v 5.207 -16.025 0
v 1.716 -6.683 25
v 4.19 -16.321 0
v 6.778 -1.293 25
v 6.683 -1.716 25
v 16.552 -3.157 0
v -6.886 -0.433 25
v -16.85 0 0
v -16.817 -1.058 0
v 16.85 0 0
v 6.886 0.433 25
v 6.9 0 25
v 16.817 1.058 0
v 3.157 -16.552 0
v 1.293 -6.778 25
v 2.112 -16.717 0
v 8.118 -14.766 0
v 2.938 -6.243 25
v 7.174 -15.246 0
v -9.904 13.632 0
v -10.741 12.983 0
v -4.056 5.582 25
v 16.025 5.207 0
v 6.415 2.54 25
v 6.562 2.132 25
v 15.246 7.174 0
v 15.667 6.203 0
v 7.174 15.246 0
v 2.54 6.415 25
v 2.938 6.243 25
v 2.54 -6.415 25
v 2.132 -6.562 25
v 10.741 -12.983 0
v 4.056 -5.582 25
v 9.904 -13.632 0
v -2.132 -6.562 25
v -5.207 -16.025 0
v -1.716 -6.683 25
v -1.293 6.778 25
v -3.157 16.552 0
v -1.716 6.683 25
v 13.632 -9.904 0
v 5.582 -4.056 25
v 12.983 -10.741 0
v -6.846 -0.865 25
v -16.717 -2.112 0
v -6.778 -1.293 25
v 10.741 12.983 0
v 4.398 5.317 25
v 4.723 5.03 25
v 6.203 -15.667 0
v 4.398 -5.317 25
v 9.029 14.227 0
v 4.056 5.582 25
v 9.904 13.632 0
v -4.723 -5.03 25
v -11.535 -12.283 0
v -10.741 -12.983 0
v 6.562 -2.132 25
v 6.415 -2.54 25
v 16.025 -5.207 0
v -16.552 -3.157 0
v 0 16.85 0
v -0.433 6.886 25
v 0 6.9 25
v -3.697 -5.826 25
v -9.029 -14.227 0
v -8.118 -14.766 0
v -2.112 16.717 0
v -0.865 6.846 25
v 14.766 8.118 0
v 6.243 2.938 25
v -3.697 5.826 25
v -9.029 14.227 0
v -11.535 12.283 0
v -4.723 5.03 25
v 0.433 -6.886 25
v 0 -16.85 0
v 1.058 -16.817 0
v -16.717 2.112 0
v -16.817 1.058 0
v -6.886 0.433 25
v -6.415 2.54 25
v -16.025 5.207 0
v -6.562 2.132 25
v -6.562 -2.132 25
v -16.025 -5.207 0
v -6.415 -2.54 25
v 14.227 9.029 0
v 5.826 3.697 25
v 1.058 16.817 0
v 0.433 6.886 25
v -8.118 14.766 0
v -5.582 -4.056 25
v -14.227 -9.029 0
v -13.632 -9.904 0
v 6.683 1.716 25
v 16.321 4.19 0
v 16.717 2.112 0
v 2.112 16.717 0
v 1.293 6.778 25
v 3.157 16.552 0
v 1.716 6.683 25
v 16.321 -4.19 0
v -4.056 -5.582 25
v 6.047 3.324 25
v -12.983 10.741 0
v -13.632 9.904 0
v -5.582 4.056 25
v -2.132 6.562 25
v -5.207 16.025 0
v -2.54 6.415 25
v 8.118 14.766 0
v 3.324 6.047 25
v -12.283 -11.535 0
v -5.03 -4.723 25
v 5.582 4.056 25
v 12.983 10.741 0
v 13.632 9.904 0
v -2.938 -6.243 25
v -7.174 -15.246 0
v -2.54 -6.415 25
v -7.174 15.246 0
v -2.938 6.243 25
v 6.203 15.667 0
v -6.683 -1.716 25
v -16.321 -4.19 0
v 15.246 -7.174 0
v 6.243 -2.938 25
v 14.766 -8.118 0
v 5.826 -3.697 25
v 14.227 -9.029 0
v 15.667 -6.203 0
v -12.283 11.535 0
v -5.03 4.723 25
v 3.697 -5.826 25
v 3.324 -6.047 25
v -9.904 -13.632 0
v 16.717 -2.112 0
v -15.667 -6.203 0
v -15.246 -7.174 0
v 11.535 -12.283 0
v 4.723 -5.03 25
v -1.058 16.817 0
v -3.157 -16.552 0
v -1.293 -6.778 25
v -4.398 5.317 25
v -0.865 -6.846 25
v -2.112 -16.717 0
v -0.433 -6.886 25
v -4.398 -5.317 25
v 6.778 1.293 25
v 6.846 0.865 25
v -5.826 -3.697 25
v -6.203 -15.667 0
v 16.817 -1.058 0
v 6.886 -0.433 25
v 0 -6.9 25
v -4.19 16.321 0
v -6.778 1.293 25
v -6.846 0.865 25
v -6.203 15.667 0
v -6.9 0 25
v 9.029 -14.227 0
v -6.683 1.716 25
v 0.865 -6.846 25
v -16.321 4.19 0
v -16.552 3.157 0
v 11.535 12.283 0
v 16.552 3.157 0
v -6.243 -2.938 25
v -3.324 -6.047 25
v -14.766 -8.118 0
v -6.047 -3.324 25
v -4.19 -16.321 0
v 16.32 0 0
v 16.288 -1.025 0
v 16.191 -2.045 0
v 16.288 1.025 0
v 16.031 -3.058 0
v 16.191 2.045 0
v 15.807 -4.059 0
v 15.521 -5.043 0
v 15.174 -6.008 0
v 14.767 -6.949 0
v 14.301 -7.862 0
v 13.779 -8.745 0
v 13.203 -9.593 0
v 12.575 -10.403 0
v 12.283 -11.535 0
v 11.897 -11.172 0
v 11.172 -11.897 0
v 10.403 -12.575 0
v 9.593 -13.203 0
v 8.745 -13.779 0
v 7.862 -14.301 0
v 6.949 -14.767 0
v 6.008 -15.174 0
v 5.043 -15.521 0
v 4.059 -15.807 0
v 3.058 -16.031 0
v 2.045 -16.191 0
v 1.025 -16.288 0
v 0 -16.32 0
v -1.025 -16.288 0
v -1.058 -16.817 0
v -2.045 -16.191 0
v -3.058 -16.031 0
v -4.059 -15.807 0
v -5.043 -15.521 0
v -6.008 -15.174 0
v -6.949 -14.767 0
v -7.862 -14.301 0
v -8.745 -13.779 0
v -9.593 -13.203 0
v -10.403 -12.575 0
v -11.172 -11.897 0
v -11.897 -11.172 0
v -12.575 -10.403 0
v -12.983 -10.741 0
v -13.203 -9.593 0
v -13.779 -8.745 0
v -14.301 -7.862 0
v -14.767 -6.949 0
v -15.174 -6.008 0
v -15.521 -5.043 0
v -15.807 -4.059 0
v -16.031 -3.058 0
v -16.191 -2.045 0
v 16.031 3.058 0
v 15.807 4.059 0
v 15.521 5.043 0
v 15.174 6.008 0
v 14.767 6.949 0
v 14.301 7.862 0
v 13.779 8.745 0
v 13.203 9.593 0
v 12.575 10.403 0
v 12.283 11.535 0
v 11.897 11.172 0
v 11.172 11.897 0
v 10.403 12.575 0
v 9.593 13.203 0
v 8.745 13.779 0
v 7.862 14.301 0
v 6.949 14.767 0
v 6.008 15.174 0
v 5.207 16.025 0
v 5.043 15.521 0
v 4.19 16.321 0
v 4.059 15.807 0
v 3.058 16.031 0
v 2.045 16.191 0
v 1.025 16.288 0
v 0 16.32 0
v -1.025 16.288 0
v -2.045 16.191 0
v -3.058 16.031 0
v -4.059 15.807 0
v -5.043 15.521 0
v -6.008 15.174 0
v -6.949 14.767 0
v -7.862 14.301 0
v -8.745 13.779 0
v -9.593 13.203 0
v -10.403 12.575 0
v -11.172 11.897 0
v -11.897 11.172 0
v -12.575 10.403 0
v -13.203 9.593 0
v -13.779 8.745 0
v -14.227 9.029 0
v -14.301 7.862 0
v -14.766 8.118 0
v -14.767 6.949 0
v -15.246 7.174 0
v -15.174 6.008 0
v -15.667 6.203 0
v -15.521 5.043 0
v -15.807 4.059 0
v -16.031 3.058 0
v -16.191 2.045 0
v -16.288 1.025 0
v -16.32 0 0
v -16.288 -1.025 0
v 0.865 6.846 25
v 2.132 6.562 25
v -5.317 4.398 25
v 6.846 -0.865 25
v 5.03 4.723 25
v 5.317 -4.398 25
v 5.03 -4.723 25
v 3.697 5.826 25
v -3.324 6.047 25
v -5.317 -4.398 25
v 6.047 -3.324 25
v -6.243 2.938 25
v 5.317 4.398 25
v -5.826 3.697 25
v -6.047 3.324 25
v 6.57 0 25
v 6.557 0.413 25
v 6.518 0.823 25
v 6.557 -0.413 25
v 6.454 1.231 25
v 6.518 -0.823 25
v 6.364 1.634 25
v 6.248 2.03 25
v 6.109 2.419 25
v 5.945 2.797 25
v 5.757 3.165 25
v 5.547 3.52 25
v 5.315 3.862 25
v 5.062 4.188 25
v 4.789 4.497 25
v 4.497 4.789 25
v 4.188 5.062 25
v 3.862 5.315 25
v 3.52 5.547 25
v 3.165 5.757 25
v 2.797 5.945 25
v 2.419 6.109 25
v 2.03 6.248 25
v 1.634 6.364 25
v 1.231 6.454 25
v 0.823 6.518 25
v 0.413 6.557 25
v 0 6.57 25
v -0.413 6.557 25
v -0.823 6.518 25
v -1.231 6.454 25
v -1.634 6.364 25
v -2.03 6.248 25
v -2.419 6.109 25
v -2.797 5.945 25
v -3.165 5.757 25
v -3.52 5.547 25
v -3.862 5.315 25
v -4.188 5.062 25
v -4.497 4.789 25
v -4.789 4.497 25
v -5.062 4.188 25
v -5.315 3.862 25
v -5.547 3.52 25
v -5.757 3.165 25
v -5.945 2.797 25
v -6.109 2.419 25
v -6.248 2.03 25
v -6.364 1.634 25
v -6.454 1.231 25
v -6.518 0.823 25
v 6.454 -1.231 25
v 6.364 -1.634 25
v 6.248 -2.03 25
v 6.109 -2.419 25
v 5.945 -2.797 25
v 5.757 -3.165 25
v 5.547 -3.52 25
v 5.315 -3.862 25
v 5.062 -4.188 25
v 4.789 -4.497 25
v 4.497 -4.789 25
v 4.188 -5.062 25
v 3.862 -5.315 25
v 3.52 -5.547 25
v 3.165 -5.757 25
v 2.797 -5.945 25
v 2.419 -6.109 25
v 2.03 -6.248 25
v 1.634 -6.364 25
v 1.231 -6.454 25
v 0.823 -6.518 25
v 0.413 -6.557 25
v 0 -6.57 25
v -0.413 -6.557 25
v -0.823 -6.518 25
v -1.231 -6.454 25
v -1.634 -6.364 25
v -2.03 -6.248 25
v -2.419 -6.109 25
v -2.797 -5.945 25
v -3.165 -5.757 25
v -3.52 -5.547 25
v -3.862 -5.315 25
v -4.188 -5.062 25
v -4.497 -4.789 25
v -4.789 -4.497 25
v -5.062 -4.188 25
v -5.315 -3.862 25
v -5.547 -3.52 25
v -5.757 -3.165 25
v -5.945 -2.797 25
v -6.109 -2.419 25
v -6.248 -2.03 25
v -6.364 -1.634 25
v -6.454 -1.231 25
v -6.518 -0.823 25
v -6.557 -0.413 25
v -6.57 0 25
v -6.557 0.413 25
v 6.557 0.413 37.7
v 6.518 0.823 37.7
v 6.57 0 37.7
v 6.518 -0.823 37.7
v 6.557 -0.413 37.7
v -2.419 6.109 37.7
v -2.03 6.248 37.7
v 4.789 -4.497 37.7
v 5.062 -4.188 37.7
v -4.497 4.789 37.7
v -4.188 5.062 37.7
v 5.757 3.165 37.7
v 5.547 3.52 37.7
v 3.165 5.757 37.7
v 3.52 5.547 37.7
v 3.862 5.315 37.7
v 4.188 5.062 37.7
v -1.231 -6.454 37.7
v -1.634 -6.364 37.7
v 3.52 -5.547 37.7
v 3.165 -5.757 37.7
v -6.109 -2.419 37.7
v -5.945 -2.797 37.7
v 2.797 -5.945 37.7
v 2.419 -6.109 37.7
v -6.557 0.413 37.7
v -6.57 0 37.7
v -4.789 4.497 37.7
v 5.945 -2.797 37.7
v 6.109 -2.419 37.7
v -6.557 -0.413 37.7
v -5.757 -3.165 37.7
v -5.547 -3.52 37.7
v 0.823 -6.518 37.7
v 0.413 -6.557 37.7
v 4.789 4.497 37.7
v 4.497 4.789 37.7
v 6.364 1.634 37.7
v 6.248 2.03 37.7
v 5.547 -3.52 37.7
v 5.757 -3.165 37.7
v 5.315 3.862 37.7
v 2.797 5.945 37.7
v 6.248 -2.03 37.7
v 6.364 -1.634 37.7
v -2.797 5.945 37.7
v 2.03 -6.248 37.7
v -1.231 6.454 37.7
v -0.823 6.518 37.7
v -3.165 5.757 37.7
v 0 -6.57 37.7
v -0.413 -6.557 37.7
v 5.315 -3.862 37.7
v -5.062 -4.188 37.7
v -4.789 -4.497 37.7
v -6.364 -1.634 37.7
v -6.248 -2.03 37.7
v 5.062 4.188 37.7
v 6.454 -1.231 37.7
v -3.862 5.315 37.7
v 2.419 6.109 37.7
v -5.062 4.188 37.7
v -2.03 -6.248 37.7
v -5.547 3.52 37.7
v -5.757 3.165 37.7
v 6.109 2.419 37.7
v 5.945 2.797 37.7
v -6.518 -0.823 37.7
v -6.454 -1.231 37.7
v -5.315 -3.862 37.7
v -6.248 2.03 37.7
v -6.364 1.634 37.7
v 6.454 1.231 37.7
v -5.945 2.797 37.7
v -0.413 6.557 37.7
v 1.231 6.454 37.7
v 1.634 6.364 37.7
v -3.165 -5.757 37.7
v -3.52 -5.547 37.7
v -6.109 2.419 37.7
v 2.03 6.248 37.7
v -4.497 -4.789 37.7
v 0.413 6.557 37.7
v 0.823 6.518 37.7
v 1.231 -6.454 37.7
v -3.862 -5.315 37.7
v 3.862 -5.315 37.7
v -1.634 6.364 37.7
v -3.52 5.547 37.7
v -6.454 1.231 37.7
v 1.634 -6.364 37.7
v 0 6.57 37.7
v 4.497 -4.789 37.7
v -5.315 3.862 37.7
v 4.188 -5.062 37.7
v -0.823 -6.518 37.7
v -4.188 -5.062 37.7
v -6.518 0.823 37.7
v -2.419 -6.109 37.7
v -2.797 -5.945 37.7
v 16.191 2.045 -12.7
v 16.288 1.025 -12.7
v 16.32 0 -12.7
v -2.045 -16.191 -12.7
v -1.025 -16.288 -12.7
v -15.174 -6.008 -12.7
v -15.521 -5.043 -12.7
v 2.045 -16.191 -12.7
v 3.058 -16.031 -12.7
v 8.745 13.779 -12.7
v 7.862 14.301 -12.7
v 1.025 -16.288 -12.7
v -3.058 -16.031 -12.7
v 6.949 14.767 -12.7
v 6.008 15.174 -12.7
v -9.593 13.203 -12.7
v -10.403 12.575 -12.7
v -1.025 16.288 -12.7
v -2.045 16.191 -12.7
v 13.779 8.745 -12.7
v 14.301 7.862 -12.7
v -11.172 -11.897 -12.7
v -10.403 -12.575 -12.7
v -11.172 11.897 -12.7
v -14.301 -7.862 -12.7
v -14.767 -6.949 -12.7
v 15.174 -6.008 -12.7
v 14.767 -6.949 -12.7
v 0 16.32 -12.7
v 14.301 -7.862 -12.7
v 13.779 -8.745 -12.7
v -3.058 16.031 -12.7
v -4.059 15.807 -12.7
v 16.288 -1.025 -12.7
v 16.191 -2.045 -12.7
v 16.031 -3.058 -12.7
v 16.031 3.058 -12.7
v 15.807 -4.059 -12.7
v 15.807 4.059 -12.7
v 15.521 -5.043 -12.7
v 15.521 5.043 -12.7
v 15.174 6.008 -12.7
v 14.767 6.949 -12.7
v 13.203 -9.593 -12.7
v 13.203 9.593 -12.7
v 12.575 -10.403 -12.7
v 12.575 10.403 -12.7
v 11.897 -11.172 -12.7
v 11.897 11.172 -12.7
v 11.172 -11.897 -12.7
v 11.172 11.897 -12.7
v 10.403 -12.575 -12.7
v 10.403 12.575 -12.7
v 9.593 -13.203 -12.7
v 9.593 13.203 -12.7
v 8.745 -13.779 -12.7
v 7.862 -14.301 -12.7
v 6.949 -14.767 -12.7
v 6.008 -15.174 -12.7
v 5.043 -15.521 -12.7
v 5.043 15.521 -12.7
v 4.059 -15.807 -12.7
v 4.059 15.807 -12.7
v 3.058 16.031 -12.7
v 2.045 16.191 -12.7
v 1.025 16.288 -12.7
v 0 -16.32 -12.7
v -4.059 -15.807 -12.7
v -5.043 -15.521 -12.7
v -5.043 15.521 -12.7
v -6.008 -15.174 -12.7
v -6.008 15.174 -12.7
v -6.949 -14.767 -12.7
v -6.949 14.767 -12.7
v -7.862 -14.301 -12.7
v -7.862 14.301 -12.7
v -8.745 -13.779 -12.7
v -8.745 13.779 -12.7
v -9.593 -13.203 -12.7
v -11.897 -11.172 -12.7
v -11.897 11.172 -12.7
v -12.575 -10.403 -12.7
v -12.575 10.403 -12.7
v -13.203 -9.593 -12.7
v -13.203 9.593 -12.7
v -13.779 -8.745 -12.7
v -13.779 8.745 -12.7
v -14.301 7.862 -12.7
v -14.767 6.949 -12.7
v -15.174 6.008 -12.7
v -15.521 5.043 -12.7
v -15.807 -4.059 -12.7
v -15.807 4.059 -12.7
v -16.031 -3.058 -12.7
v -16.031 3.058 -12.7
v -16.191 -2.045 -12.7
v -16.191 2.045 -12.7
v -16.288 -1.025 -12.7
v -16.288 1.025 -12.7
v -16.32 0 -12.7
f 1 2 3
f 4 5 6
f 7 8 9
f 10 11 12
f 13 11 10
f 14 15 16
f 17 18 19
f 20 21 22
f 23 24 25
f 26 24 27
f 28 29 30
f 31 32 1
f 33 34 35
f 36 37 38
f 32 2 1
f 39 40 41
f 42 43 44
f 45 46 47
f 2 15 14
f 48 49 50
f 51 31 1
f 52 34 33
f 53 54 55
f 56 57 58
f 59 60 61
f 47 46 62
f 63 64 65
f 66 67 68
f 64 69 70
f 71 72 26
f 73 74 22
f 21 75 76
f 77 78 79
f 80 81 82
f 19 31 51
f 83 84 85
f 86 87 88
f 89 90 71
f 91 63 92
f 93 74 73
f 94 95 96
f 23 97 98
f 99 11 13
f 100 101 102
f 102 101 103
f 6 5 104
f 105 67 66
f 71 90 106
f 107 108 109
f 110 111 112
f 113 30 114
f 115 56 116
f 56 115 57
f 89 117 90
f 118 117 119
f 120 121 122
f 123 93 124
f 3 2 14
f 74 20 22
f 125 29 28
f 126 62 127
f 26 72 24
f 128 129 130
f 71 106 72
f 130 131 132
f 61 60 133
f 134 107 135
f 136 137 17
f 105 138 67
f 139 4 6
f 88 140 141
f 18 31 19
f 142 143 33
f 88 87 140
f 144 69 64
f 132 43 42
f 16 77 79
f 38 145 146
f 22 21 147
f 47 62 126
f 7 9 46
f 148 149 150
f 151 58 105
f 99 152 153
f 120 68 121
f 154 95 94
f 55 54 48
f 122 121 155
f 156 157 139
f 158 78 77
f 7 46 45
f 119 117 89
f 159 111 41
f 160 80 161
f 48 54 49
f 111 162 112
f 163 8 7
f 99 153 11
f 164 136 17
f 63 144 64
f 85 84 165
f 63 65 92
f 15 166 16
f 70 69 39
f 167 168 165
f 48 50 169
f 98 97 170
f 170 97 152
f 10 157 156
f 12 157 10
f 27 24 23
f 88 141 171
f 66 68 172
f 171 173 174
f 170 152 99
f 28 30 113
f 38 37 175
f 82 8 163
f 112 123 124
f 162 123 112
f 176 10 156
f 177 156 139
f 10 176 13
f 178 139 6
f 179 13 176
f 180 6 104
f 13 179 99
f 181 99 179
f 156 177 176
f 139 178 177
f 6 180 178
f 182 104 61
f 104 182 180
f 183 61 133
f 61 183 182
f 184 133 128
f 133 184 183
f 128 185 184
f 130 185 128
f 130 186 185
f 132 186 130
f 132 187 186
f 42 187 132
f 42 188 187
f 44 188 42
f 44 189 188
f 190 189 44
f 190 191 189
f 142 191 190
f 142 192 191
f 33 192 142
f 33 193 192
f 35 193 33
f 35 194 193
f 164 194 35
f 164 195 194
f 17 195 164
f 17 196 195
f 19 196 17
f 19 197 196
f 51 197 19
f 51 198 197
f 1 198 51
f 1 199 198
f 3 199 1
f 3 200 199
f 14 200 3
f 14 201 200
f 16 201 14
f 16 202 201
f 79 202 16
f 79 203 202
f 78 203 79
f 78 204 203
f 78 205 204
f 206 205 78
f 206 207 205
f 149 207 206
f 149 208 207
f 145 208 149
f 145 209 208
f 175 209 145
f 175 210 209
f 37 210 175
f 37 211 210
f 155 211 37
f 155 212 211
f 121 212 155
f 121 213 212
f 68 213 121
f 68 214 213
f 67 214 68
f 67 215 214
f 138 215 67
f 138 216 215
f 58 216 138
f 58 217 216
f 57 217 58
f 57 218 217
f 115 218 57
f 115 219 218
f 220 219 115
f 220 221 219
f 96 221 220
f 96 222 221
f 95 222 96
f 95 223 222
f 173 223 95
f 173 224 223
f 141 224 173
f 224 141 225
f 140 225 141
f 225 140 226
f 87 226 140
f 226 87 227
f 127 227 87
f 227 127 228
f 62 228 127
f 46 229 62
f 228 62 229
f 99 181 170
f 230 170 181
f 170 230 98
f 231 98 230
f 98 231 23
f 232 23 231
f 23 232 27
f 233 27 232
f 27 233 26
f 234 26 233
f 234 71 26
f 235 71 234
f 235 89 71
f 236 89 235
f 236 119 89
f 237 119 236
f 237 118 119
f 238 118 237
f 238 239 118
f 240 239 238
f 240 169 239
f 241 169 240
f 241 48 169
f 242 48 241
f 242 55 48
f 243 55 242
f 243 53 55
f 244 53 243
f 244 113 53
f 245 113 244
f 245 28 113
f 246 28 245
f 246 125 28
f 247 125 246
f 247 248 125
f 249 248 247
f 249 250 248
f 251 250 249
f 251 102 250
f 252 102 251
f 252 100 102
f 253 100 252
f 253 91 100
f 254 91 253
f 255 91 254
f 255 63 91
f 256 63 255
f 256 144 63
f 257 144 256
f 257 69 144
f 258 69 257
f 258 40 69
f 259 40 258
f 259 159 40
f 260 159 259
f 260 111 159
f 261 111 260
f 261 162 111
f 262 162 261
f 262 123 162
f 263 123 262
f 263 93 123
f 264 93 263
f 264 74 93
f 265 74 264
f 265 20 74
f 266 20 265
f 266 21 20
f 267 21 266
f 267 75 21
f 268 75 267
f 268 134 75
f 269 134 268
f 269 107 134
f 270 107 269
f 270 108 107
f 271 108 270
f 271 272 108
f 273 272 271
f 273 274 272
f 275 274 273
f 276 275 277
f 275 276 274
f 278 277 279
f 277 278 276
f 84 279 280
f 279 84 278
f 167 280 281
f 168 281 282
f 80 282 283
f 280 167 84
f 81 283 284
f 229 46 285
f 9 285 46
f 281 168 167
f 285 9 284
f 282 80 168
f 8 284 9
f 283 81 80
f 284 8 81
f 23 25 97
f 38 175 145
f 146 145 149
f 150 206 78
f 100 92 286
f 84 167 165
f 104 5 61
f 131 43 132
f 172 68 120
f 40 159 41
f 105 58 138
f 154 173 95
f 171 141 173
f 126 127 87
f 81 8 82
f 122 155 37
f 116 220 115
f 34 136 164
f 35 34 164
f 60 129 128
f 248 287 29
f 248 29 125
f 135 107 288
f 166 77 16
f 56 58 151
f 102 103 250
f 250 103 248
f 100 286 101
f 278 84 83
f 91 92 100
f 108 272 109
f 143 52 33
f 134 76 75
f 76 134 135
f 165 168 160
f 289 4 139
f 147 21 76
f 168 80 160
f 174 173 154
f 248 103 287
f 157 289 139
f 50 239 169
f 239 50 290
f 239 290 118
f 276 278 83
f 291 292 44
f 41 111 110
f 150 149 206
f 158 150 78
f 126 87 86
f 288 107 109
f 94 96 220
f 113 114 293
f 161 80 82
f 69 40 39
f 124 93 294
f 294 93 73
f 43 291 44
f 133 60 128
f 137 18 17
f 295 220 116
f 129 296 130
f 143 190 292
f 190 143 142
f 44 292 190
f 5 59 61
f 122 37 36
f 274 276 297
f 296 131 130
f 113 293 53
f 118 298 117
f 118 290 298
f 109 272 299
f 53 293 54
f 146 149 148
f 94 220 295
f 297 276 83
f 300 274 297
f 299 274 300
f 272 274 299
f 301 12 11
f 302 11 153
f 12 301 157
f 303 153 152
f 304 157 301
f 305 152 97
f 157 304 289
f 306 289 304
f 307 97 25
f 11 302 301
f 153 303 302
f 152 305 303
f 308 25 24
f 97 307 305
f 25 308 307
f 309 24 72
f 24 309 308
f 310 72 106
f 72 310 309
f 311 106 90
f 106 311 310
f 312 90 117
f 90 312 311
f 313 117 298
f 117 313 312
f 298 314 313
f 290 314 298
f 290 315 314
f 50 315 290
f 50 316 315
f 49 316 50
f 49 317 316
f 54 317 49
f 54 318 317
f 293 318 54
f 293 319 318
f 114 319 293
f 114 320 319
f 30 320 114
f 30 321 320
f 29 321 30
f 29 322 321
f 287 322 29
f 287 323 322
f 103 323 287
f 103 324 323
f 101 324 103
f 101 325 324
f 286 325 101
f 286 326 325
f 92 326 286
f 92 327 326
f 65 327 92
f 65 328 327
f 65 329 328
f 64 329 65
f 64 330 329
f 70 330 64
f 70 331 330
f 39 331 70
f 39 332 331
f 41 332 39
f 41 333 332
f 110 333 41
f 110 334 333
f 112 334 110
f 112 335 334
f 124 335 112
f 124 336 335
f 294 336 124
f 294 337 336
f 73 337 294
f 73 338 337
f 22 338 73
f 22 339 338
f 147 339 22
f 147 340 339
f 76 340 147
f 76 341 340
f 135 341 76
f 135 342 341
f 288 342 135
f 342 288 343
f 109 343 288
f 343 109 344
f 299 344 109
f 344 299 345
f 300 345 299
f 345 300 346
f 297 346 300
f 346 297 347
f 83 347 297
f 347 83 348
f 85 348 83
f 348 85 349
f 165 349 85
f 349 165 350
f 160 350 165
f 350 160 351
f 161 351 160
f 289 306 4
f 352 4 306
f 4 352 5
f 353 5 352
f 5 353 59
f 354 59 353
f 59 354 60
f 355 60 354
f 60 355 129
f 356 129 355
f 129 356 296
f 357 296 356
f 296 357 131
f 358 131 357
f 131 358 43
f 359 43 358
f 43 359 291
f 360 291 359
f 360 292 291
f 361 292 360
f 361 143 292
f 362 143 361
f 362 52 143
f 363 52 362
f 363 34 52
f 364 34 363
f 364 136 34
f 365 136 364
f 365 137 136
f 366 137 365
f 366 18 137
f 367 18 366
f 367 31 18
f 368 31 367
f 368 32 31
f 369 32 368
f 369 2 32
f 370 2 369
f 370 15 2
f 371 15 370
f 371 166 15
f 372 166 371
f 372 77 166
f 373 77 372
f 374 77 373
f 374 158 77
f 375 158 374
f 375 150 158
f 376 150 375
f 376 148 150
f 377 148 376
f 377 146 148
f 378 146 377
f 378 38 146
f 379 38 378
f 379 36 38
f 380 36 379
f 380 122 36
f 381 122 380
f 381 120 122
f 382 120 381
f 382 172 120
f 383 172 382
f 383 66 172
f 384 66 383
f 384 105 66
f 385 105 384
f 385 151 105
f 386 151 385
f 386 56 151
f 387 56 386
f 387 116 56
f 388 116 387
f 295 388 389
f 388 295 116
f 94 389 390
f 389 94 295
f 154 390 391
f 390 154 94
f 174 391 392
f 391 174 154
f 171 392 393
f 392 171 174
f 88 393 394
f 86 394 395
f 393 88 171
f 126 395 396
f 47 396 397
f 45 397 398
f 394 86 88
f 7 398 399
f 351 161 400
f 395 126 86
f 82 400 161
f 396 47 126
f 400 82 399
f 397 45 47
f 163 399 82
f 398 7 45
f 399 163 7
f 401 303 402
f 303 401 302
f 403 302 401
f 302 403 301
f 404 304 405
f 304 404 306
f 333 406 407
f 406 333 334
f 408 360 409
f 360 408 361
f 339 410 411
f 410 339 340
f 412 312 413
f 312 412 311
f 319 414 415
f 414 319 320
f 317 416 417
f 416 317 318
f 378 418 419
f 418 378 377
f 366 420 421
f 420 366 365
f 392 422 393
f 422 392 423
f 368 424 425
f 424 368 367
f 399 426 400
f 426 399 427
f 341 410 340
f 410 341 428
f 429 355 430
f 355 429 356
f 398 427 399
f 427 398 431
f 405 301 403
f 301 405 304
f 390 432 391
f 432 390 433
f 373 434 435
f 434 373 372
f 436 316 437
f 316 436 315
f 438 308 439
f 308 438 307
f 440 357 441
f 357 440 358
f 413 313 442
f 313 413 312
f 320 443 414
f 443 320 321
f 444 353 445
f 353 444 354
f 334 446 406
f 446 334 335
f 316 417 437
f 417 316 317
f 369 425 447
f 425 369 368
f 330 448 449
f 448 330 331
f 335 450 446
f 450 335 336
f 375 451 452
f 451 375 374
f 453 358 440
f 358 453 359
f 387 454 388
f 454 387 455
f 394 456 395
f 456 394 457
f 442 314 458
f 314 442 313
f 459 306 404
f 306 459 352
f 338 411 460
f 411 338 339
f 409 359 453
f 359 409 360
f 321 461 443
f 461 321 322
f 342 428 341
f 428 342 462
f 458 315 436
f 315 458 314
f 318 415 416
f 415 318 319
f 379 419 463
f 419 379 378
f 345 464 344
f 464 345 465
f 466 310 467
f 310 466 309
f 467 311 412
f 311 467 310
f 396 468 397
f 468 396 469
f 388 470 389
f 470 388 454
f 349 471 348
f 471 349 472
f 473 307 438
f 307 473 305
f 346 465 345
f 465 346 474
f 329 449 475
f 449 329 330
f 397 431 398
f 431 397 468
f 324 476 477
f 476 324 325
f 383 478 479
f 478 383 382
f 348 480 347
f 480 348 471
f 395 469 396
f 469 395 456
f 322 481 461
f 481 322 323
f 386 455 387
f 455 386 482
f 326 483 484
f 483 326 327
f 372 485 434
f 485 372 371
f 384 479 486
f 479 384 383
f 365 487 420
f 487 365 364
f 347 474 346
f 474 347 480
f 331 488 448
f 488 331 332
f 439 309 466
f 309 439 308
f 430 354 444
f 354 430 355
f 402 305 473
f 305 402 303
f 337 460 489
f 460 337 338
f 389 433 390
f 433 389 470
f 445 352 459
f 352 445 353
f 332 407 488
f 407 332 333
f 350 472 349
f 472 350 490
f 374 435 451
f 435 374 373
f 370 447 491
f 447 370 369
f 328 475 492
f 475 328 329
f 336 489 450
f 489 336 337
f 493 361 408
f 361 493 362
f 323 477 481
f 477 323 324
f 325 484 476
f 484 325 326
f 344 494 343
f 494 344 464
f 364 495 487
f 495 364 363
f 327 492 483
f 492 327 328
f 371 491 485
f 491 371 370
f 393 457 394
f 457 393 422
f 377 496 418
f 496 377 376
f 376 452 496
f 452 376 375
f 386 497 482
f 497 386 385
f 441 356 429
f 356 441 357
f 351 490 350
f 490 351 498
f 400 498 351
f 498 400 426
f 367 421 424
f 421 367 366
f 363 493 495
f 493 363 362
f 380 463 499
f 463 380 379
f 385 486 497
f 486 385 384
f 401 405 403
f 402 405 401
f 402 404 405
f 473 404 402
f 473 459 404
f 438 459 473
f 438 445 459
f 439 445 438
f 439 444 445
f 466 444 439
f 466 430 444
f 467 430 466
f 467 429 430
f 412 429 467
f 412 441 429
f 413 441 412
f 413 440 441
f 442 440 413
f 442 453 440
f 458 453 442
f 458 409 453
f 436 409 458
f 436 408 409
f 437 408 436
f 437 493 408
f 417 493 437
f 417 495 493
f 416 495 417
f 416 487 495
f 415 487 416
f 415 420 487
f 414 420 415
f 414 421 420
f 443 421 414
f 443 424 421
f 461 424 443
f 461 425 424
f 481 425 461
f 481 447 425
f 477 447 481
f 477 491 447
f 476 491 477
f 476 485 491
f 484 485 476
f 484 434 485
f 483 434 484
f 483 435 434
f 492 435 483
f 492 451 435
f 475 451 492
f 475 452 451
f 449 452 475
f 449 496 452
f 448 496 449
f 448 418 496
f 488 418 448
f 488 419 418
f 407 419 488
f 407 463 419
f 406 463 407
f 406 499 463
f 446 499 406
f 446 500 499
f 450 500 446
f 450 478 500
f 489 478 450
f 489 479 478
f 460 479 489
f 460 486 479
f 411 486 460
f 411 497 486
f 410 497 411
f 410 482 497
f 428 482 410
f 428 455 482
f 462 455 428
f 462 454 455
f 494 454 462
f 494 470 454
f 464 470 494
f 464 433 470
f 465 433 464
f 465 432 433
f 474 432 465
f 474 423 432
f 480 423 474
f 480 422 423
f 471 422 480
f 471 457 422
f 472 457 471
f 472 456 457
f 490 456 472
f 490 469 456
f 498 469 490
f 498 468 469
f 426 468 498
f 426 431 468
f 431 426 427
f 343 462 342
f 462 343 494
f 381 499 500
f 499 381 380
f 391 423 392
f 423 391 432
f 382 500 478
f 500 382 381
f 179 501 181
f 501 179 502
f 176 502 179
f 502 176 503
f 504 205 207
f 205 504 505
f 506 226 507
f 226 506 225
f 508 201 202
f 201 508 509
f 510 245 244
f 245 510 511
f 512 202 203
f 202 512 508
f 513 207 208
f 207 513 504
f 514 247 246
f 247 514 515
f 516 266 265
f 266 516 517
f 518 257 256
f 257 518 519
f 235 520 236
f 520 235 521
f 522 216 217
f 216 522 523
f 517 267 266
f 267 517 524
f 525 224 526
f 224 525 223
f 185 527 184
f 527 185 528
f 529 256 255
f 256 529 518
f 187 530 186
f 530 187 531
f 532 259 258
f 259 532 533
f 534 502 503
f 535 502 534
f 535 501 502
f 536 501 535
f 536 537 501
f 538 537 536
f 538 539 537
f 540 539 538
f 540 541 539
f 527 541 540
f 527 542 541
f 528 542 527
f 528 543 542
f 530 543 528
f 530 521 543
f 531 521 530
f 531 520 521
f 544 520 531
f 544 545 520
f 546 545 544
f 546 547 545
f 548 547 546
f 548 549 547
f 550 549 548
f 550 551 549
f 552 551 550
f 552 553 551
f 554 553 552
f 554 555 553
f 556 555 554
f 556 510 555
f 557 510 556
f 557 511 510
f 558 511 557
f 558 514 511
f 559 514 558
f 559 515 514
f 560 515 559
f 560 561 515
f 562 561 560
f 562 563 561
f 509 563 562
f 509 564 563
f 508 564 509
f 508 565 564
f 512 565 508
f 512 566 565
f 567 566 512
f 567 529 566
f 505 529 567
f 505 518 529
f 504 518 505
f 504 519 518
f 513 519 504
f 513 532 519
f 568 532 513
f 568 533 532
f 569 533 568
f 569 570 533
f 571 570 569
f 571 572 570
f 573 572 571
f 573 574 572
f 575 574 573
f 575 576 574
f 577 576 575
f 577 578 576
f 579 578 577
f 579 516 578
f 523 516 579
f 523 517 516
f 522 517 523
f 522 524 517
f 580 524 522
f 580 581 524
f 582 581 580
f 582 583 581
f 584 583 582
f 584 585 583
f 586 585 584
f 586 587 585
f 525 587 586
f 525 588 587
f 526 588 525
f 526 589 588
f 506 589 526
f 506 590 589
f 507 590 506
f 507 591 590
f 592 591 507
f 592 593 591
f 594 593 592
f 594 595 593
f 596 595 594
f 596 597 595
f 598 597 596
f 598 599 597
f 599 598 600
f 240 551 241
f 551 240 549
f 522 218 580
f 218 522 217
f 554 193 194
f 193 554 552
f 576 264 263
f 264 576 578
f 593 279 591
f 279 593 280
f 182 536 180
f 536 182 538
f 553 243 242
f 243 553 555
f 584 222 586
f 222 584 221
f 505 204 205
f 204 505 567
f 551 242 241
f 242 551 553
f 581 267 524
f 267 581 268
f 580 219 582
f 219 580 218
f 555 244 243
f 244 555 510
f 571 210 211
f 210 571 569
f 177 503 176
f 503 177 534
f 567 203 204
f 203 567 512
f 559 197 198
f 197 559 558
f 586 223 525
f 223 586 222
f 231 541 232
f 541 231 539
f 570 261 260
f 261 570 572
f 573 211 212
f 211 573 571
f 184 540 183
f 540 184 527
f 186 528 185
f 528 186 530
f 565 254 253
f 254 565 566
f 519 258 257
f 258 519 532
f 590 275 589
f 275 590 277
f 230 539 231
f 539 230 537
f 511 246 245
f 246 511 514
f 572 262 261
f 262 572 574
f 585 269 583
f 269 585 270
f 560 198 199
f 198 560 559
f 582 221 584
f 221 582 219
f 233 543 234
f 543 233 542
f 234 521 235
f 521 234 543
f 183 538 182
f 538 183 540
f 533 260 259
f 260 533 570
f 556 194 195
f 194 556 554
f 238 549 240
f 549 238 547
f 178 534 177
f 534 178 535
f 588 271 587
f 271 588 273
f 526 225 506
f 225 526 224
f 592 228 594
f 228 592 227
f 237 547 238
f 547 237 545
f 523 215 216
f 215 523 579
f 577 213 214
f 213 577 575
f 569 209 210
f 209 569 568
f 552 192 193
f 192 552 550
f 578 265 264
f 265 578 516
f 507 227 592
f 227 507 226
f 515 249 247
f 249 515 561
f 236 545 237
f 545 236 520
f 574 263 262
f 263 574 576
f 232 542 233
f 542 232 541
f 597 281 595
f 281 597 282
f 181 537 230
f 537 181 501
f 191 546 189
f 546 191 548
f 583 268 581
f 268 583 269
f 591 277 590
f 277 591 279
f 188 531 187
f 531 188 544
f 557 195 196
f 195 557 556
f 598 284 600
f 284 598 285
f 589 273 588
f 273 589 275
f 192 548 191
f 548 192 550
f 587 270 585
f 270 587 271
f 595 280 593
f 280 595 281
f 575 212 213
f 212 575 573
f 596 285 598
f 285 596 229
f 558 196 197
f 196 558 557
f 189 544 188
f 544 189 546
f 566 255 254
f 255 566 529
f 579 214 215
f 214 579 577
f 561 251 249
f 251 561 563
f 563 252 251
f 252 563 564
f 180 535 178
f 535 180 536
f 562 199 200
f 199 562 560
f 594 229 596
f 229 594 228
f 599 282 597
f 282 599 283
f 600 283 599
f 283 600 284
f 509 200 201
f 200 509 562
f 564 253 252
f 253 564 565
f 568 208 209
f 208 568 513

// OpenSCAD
//All measurements are in millimeters.

//Size of larger tube?
tube_1 = 33.7; //[13.8:BT-5, 18.7:BT-20, 24.8:BT-50, 33.7:BT-55, 34.2:BT-56, 41.6:BT-60, 56.3:BT-70, 66.04:BT-80, 100:BT-101]

//Size of smaller tube?
tube_2 = 13.8; //[13.8:BT-5, 18.7:BT-20, 24.8:BT-50, 33.7:BT-55, 34.2:BT-56, 41.6:BT-60, 56.3:BT-70, 66.04:BT-80, 100:BT-101]

//How long do you want the taper to be?
taper_length = 25;

//Diameter of the hole through the center?  Use "0" for no hole.  Must be smaller than diameter of the small tube.
hole = 0;

wall_1 = tube_1 == 13.8 || tube_1 == 18.7 || tube_1 == 24.8 ? 0.33 : 0.53;

wall_2 = tube_2 == 13.8 || tube_2 == 18.7 || tube_2 == 24.8 ? 0.33 : 0.53;

difference(){

union(){
    
cylinder(h=taper_length, r1=tube_1/2, r2=tube_2/2, center=false, $fn=100);

translate([0,0,taper_length]) cylinder(h=12.7,r=tube_2/2-wall_2, center=false, $fn=100);

translate([0,0,-12.7]) cylinder(h=12.7,r=tube_1/2-wall_1, center=false, $fn=100);
}

translate([0,0,-12.7]) cylinder(h=taper_length+25.4, r=hole/2, center=false, $fn=100);    
}
